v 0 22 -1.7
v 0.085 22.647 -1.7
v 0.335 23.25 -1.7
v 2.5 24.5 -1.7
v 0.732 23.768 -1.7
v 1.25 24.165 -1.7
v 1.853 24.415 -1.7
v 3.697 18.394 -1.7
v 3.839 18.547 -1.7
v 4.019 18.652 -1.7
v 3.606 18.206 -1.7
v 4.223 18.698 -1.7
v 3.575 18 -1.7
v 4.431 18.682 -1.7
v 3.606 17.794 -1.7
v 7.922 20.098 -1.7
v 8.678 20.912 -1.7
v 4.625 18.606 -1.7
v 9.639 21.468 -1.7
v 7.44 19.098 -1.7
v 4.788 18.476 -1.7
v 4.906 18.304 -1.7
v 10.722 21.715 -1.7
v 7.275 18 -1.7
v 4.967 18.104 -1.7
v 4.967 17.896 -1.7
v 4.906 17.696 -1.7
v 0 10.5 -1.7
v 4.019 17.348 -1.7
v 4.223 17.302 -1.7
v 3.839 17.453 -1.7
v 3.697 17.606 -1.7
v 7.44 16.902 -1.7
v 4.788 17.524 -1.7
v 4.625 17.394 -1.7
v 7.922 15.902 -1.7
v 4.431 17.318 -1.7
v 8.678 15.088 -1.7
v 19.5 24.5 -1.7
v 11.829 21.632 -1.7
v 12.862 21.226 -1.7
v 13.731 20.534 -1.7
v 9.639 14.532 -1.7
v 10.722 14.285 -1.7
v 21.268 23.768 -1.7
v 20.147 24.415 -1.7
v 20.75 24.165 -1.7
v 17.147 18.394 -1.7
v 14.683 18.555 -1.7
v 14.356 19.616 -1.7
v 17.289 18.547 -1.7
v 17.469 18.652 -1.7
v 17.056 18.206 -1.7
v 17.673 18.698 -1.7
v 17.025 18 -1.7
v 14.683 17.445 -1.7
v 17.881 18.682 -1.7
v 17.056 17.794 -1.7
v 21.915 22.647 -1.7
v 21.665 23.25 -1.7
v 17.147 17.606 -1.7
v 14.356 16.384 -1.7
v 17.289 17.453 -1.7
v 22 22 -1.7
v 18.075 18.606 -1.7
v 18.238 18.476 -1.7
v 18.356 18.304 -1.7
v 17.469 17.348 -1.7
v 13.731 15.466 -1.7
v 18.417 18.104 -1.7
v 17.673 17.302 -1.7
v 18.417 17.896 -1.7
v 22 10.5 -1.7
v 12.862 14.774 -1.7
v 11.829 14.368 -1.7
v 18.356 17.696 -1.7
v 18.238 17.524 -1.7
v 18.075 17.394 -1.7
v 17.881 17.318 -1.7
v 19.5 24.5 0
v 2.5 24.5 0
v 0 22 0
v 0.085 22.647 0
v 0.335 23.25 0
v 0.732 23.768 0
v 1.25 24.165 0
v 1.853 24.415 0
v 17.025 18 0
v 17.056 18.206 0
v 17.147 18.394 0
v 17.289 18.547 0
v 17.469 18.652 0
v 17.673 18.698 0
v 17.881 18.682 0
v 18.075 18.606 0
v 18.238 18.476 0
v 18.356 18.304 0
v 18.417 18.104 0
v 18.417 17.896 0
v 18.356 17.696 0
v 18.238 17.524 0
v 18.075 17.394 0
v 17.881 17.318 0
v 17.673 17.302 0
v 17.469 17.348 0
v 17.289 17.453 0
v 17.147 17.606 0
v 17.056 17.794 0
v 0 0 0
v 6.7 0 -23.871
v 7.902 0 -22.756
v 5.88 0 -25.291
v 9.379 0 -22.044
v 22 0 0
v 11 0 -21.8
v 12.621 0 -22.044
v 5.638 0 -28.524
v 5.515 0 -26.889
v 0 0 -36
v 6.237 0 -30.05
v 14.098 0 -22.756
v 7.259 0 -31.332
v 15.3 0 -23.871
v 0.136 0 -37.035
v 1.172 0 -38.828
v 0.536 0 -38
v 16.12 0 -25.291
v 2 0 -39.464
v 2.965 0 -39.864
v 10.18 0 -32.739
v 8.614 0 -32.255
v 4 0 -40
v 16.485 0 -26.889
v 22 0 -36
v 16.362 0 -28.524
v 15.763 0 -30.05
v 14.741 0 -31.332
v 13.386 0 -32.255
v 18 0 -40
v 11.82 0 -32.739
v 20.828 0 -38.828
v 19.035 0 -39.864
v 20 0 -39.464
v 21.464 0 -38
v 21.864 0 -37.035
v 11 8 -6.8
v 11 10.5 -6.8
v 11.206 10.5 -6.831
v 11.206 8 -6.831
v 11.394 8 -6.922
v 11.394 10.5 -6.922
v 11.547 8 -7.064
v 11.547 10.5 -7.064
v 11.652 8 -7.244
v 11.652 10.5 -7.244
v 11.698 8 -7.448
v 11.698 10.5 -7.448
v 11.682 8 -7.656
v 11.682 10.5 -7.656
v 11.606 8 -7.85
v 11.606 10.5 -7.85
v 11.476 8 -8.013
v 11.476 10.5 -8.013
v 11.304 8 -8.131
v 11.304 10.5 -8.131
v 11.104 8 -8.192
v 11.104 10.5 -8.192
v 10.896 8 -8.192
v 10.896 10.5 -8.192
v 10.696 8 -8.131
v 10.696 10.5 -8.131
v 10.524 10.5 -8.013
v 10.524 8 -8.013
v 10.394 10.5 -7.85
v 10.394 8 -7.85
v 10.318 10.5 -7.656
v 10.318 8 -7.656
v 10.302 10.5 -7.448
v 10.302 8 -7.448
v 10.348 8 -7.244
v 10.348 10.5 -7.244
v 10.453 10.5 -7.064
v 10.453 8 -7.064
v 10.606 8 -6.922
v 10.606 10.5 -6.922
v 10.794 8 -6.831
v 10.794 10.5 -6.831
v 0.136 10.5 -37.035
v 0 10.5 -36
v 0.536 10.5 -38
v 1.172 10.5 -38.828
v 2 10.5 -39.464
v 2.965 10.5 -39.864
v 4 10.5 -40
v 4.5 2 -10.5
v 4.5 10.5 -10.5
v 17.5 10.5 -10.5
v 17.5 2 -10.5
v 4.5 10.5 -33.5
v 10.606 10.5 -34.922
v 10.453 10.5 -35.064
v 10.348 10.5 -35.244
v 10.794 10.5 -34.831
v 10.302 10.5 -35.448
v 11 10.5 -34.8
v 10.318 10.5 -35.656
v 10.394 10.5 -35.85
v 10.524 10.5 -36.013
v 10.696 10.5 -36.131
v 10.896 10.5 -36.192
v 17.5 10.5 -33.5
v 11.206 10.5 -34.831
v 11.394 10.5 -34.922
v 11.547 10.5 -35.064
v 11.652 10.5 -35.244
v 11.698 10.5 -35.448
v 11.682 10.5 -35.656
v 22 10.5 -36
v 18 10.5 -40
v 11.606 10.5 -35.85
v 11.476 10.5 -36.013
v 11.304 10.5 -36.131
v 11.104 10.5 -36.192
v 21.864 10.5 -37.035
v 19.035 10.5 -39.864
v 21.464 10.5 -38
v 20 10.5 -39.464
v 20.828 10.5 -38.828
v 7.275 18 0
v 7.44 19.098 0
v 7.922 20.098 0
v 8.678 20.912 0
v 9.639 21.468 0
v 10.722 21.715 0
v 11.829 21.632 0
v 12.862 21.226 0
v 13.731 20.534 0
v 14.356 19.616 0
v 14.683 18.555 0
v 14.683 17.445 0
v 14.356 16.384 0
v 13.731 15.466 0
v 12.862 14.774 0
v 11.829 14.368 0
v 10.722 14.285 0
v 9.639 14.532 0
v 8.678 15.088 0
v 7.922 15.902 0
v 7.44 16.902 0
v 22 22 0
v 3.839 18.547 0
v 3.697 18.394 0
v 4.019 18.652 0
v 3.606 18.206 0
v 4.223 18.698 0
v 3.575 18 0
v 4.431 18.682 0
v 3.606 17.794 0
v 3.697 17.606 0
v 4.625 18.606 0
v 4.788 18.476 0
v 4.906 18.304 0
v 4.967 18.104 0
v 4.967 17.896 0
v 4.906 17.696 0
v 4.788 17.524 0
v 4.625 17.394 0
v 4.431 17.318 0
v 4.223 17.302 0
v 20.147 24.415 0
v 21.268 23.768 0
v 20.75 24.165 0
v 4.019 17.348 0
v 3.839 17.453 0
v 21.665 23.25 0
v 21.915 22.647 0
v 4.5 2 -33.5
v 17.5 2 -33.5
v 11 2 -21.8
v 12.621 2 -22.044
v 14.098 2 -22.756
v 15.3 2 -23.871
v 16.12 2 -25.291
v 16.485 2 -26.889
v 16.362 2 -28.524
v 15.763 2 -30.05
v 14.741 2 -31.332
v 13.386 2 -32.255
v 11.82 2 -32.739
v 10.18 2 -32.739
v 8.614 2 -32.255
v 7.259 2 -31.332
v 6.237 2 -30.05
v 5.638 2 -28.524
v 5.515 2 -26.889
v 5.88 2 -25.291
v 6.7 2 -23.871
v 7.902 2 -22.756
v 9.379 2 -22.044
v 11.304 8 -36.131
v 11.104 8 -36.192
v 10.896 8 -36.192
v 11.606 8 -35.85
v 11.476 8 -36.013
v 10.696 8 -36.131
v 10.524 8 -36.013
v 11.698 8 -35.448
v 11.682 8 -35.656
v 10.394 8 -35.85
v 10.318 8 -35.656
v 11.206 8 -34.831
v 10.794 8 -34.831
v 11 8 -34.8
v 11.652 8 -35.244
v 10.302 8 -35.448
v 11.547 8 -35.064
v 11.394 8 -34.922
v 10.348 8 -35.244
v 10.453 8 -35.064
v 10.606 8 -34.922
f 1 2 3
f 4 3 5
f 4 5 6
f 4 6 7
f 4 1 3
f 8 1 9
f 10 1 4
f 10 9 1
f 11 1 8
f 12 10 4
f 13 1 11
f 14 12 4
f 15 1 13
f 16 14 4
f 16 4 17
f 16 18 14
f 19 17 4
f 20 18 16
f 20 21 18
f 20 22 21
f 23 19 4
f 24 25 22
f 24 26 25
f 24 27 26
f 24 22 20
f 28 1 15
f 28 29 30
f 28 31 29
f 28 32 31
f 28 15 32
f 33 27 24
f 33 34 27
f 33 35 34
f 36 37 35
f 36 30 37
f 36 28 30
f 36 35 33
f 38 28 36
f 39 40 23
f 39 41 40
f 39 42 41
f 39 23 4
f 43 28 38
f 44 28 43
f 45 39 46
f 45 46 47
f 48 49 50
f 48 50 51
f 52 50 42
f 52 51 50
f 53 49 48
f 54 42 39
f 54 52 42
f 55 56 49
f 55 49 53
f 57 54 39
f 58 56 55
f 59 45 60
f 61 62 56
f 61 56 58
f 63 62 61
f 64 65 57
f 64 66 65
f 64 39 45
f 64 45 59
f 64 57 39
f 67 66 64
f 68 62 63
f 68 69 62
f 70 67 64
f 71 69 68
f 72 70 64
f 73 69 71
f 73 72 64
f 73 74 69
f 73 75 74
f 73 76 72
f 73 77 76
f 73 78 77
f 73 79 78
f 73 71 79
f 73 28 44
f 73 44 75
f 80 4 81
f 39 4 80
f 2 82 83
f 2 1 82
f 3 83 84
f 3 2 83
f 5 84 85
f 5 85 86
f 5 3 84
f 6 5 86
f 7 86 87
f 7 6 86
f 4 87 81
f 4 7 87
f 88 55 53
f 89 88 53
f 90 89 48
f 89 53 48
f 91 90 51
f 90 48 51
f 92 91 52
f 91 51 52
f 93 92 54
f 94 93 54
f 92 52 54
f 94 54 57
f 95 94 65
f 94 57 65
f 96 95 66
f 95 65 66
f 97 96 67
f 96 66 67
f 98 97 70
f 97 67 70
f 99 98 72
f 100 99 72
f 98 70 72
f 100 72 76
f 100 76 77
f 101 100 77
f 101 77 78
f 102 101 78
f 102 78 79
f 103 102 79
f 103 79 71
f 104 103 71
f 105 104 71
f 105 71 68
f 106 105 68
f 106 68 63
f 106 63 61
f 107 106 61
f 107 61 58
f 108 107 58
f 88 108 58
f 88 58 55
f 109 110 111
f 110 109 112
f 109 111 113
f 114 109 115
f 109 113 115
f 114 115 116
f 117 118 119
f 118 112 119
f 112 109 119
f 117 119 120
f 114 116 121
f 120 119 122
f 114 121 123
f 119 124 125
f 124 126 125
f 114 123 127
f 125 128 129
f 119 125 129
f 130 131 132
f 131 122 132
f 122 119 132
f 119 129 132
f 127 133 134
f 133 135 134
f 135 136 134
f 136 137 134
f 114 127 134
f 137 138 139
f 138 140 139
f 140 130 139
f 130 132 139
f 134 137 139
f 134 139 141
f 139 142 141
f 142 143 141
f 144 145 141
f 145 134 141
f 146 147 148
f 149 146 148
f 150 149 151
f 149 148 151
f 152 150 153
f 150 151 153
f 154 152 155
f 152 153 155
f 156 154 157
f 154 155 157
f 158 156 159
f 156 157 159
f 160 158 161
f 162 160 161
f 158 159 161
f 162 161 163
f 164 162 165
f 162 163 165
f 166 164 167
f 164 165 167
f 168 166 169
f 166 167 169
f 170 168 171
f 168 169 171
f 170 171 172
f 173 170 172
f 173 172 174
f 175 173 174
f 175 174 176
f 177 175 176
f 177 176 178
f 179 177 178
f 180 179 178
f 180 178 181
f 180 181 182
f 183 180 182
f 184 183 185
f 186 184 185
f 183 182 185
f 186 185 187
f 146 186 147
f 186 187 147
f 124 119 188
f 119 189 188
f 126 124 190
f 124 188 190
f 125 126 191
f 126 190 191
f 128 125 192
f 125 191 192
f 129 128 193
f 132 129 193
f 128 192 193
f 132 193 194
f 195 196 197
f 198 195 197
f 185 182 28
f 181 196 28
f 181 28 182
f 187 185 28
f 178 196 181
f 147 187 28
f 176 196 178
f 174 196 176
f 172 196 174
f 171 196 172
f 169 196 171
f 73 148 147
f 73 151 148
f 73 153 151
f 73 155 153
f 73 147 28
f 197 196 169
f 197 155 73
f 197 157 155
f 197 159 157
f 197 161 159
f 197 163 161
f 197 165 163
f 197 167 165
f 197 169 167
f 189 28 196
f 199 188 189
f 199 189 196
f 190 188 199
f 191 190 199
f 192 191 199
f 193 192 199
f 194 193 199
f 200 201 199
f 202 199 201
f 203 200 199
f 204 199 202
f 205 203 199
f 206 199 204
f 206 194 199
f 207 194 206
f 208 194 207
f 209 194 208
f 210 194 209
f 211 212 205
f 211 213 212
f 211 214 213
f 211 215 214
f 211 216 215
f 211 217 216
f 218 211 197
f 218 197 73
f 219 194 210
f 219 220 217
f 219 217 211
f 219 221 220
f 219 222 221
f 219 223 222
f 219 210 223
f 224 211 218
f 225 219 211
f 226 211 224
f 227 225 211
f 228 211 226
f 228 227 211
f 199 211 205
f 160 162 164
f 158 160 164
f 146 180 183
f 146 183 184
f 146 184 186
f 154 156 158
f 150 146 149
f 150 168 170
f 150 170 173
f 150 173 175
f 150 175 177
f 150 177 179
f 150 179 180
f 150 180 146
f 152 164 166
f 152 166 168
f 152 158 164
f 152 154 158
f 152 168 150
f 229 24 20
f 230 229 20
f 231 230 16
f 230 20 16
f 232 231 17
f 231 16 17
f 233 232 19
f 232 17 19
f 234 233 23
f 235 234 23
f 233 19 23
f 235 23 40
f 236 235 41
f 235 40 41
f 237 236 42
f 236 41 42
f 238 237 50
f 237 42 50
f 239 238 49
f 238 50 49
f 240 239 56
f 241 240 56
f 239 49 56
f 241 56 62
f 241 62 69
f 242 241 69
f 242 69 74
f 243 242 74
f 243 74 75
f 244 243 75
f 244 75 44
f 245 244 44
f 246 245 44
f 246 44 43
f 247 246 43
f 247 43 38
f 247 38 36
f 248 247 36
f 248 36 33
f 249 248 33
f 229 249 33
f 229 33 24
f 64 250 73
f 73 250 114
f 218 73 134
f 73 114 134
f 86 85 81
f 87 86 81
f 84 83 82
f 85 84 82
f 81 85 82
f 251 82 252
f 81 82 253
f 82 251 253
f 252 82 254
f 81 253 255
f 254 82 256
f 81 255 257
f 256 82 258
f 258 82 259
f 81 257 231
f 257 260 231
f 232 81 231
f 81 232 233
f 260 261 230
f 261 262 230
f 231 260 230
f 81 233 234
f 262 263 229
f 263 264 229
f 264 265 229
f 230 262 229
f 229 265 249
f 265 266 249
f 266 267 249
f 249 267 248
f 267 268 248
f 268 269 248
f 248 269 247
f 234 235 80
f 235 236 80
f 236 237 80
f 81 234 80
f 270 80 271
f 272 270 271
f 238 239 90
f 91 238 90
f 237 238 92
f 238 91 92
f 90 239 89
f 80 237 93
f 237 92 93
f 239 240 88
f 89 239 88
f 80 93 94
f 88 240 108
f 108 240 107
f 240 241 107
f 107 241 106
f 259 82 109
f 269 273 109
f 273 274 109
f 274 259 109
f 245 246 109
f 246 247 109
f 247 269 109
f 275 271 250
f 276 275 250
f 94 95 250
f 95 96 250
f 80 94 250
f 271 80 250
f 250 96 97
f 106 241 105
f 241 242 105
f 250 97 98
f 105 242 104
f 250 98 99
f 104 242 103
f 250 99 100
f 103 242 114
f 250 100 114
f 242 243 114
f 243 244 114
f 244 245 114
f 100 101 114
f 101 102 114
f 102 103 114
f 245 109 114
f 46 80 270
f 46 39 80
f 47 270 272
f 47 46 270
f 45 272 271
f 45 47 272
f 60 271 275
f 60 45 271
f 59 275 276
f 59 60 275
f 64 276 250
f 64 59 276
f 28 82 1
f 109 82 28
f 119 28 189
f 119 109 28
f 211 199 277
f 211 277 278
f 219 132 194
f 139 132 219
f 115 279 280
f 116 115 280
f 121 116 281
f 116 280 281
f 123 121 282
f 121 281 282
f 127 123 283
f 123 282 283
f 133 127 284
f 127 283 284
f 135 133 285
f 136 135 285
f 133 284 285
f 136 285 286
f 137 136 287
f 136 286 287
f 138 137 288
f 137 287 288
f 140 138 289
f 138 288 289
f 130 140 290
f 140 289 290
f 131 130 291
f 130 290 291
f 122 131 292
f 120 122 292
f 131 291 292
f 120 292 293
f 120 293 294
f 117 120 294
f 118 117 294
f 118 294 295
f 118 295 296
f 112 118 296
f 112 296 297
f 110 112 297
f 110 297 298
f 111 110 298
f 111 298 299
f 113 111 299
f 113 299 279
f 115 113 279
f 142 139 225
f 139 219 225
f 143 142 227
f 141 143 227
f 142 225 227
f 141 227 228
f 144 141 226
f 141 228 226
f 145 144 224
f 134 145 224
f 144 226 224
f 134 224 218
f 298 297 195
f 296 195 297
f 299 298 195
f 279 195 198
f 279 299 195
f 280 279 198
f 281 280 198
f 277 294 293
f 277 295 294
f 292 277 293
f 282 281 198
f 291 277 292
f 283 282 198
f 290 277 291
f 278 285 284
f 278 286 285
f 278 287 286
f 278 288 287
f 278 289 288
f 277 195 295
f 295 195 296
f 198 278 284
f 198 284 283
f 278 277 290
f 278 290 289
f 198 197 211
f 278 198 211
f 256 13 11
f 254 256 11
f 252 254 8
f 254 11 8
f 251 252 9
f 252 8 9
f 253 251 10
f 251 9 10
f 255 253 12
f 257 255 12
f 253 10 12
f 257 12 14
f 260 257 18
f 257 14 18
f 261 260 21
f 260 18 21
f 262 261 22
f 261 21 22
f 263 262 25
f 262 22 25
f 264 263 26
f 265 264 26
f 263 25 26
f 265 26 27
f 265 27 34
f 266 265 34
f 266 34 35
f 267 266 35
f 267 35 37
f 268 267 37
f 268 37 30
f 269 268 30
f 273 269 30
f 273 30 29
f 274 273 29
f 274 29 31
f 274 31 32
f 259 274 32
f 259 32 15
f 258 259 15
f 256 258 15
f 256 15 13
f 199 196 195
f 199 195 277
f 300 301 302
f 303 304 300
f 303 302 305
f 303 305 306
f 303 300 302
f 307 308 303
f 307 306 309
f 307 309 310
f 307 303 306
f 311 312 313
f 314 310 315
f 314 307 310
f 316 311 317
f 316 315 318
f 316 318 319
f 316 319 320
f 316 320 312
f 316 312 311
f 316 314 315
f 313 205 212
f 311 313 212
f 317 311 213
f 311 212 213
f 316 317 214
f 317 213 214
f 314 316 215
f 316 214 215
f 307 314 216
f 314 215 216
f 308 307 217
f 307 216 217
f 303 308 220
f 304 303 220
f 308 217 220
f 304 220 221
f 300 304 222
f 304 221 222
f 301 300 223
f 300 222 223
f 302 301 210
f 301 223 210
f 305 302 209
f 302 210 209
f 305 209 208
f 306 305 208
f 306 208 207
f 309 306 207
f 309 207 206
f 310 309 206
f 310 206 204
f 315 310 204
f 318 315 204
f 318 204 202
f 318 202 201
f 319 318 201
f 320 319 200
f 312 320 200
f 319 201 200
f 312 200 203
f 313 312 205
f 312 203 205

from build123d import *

# Parameters (mm, degrees)
SKETCH1_W           = 22
SKETCH1_H           = 40
BOSS_EXTRUDE1_DEPTH = 10.5
SKETCH2_W           = 13
SKETCH2_H           = 23
CUT_EXTRUDE1_DEPTH  = 8.5
SKETCH3_R           = 5.5
CUT_EXTRUDE2_DEPTH  = 47.435439053
SKETCH4_W           = 22
SKETCH4_H           = 1.7
BOSS_EXTRUDE2_DEPTH = 14
SKETCH5_R           = 3.725
CUT_EXTRUDE3_DEPTH  = 51.508811113
SKETCH5_3_R         = 3.725
SKETCH5_3_R_2       = 0.7
CUT_EXTRUDE4_DEPTH  = 10
SKETCH6_R           = 0.7
CUT_EXTRUDE5_DEPTH  = 2.5
FILLET1_R           = 4
FILLET2_R           = 2.5


with BuildPart() as part:
    # Sketch1 → Boss-Extrude1 (new body)
    with BuildSketch(Plane(origin=(0, 0, 0), x_dir=(1, 0, 0), z_dir=(0, 1, 0))):
        with Locations((11, 20)):
            Rectangle(SKETCH1_W, SKETCH1_H)
    extrude(amount=BOSS_EXTRUDE1_DEPTH)

    # Sketch2 → Cut-Extrude1 (cut)
    with BuildSketch(Plane(origin=(0, 10.5, 0), x_dir=(1, 0, 0), z_dir=(0, 1, 0))):
        with Locations((11, 22)):
            Rectangle(SKETCH2_W, SKETCH2_H)
    extrude(amount=-CUT_EXTRUDE1_DEPTH, mode=Mode.SUBTRACT)

    # Sketch3 → Cut-Extrude2 (cut, through all)
    with BuildSketch(Plane(origin=(0, 2, 0), x_dir=(1, 0, 0), z_dir=(0, 1, 0))):
        with Locations((11, 27.3)):
            Circle(SKETCH3_R)
    extrude(amount=-CUT_EXTRUDE2_DEPTH, mode=Mode.SUBTRACT)

    # Sketch4 → Boss-Extrude2 (add)
    with BuildSketch(Plane(origin=(0, 10.5, 0), x_dir=(1, 0, 0), z_dir=(0, 1, 0))):
        with Locations((11, 0.85)):
            Rectangle(SKETCH4_W, SKETCH4_H)
    extrude(amount=BOSS_EXTRUDE2_DEPTH)

    # Sketch5 → Cut-Extrude3 (cut, through all)
    with BuildSketch(Plane(origin=(0, 0, -1.7), x_dir=(-1, 0, 0), z_dir=(0, 0, -1))):
        with Locations((-11, 18)):
            Circle(SKETCH5_R)
    extrude(amount=-CUT_EXTRUDE3_DEPTH, mode=Mode.SUBTRACT)

    # Sketch5<3> → Cut-Extrude4 (cut)
    with BuildSketch(Plane(origin=(0, 0, -1.7), x_dir=(-1, 0, 0), z_dir=(0, 0, -1))):
        with Locations((-11, 18)):
            Circle(SKETCH5_3_R)
        with Locations((-17.725, 18)):
            Circle(SKETCH5_3_R_2)
        with Locations((-4.275, 18)):
            Circle(SKETCH5_3_R_2)
    extrude(amount=-CUT_EXTRUDE4_DEPTH, mode=Mode.SUBTRACT)

    # Sketch6 → Cut-Extrude5 (cut)
    with BuildSketch(Plane(origin=(0, 10.5, 0), x_dir=(1, 0, 0), z_dir=(0, 1, 0))):
        with Locations((11, 35.5)):
            Circle(SKETCH6_R)
        with Locations((11, 7.5)):
            Circle(SKETCH6_R)
    extrude(amount=-CUT_EXTRUDE5_DEPTH, mode=Mode.SUBTRACT)

    # Fillet1
    fillet1_edges = [part.edges().sort_by_distance(p)[0] for p in [
        (0, 5.25, -40),
        (22, 5.25, -40),
    ]]
    fillet(fillet1_edges, radius=FILLET1_R)

    # Fillet2
    fillet2_edges = [part.edges().sort_by_distance(p)[0] for p in [
        (0, 24.5, -0.85),
        (22, 24.5, -0.85),
    ]]
    fillet(fillet2_edges, radius=FILLET2_R)


solid = part.part
